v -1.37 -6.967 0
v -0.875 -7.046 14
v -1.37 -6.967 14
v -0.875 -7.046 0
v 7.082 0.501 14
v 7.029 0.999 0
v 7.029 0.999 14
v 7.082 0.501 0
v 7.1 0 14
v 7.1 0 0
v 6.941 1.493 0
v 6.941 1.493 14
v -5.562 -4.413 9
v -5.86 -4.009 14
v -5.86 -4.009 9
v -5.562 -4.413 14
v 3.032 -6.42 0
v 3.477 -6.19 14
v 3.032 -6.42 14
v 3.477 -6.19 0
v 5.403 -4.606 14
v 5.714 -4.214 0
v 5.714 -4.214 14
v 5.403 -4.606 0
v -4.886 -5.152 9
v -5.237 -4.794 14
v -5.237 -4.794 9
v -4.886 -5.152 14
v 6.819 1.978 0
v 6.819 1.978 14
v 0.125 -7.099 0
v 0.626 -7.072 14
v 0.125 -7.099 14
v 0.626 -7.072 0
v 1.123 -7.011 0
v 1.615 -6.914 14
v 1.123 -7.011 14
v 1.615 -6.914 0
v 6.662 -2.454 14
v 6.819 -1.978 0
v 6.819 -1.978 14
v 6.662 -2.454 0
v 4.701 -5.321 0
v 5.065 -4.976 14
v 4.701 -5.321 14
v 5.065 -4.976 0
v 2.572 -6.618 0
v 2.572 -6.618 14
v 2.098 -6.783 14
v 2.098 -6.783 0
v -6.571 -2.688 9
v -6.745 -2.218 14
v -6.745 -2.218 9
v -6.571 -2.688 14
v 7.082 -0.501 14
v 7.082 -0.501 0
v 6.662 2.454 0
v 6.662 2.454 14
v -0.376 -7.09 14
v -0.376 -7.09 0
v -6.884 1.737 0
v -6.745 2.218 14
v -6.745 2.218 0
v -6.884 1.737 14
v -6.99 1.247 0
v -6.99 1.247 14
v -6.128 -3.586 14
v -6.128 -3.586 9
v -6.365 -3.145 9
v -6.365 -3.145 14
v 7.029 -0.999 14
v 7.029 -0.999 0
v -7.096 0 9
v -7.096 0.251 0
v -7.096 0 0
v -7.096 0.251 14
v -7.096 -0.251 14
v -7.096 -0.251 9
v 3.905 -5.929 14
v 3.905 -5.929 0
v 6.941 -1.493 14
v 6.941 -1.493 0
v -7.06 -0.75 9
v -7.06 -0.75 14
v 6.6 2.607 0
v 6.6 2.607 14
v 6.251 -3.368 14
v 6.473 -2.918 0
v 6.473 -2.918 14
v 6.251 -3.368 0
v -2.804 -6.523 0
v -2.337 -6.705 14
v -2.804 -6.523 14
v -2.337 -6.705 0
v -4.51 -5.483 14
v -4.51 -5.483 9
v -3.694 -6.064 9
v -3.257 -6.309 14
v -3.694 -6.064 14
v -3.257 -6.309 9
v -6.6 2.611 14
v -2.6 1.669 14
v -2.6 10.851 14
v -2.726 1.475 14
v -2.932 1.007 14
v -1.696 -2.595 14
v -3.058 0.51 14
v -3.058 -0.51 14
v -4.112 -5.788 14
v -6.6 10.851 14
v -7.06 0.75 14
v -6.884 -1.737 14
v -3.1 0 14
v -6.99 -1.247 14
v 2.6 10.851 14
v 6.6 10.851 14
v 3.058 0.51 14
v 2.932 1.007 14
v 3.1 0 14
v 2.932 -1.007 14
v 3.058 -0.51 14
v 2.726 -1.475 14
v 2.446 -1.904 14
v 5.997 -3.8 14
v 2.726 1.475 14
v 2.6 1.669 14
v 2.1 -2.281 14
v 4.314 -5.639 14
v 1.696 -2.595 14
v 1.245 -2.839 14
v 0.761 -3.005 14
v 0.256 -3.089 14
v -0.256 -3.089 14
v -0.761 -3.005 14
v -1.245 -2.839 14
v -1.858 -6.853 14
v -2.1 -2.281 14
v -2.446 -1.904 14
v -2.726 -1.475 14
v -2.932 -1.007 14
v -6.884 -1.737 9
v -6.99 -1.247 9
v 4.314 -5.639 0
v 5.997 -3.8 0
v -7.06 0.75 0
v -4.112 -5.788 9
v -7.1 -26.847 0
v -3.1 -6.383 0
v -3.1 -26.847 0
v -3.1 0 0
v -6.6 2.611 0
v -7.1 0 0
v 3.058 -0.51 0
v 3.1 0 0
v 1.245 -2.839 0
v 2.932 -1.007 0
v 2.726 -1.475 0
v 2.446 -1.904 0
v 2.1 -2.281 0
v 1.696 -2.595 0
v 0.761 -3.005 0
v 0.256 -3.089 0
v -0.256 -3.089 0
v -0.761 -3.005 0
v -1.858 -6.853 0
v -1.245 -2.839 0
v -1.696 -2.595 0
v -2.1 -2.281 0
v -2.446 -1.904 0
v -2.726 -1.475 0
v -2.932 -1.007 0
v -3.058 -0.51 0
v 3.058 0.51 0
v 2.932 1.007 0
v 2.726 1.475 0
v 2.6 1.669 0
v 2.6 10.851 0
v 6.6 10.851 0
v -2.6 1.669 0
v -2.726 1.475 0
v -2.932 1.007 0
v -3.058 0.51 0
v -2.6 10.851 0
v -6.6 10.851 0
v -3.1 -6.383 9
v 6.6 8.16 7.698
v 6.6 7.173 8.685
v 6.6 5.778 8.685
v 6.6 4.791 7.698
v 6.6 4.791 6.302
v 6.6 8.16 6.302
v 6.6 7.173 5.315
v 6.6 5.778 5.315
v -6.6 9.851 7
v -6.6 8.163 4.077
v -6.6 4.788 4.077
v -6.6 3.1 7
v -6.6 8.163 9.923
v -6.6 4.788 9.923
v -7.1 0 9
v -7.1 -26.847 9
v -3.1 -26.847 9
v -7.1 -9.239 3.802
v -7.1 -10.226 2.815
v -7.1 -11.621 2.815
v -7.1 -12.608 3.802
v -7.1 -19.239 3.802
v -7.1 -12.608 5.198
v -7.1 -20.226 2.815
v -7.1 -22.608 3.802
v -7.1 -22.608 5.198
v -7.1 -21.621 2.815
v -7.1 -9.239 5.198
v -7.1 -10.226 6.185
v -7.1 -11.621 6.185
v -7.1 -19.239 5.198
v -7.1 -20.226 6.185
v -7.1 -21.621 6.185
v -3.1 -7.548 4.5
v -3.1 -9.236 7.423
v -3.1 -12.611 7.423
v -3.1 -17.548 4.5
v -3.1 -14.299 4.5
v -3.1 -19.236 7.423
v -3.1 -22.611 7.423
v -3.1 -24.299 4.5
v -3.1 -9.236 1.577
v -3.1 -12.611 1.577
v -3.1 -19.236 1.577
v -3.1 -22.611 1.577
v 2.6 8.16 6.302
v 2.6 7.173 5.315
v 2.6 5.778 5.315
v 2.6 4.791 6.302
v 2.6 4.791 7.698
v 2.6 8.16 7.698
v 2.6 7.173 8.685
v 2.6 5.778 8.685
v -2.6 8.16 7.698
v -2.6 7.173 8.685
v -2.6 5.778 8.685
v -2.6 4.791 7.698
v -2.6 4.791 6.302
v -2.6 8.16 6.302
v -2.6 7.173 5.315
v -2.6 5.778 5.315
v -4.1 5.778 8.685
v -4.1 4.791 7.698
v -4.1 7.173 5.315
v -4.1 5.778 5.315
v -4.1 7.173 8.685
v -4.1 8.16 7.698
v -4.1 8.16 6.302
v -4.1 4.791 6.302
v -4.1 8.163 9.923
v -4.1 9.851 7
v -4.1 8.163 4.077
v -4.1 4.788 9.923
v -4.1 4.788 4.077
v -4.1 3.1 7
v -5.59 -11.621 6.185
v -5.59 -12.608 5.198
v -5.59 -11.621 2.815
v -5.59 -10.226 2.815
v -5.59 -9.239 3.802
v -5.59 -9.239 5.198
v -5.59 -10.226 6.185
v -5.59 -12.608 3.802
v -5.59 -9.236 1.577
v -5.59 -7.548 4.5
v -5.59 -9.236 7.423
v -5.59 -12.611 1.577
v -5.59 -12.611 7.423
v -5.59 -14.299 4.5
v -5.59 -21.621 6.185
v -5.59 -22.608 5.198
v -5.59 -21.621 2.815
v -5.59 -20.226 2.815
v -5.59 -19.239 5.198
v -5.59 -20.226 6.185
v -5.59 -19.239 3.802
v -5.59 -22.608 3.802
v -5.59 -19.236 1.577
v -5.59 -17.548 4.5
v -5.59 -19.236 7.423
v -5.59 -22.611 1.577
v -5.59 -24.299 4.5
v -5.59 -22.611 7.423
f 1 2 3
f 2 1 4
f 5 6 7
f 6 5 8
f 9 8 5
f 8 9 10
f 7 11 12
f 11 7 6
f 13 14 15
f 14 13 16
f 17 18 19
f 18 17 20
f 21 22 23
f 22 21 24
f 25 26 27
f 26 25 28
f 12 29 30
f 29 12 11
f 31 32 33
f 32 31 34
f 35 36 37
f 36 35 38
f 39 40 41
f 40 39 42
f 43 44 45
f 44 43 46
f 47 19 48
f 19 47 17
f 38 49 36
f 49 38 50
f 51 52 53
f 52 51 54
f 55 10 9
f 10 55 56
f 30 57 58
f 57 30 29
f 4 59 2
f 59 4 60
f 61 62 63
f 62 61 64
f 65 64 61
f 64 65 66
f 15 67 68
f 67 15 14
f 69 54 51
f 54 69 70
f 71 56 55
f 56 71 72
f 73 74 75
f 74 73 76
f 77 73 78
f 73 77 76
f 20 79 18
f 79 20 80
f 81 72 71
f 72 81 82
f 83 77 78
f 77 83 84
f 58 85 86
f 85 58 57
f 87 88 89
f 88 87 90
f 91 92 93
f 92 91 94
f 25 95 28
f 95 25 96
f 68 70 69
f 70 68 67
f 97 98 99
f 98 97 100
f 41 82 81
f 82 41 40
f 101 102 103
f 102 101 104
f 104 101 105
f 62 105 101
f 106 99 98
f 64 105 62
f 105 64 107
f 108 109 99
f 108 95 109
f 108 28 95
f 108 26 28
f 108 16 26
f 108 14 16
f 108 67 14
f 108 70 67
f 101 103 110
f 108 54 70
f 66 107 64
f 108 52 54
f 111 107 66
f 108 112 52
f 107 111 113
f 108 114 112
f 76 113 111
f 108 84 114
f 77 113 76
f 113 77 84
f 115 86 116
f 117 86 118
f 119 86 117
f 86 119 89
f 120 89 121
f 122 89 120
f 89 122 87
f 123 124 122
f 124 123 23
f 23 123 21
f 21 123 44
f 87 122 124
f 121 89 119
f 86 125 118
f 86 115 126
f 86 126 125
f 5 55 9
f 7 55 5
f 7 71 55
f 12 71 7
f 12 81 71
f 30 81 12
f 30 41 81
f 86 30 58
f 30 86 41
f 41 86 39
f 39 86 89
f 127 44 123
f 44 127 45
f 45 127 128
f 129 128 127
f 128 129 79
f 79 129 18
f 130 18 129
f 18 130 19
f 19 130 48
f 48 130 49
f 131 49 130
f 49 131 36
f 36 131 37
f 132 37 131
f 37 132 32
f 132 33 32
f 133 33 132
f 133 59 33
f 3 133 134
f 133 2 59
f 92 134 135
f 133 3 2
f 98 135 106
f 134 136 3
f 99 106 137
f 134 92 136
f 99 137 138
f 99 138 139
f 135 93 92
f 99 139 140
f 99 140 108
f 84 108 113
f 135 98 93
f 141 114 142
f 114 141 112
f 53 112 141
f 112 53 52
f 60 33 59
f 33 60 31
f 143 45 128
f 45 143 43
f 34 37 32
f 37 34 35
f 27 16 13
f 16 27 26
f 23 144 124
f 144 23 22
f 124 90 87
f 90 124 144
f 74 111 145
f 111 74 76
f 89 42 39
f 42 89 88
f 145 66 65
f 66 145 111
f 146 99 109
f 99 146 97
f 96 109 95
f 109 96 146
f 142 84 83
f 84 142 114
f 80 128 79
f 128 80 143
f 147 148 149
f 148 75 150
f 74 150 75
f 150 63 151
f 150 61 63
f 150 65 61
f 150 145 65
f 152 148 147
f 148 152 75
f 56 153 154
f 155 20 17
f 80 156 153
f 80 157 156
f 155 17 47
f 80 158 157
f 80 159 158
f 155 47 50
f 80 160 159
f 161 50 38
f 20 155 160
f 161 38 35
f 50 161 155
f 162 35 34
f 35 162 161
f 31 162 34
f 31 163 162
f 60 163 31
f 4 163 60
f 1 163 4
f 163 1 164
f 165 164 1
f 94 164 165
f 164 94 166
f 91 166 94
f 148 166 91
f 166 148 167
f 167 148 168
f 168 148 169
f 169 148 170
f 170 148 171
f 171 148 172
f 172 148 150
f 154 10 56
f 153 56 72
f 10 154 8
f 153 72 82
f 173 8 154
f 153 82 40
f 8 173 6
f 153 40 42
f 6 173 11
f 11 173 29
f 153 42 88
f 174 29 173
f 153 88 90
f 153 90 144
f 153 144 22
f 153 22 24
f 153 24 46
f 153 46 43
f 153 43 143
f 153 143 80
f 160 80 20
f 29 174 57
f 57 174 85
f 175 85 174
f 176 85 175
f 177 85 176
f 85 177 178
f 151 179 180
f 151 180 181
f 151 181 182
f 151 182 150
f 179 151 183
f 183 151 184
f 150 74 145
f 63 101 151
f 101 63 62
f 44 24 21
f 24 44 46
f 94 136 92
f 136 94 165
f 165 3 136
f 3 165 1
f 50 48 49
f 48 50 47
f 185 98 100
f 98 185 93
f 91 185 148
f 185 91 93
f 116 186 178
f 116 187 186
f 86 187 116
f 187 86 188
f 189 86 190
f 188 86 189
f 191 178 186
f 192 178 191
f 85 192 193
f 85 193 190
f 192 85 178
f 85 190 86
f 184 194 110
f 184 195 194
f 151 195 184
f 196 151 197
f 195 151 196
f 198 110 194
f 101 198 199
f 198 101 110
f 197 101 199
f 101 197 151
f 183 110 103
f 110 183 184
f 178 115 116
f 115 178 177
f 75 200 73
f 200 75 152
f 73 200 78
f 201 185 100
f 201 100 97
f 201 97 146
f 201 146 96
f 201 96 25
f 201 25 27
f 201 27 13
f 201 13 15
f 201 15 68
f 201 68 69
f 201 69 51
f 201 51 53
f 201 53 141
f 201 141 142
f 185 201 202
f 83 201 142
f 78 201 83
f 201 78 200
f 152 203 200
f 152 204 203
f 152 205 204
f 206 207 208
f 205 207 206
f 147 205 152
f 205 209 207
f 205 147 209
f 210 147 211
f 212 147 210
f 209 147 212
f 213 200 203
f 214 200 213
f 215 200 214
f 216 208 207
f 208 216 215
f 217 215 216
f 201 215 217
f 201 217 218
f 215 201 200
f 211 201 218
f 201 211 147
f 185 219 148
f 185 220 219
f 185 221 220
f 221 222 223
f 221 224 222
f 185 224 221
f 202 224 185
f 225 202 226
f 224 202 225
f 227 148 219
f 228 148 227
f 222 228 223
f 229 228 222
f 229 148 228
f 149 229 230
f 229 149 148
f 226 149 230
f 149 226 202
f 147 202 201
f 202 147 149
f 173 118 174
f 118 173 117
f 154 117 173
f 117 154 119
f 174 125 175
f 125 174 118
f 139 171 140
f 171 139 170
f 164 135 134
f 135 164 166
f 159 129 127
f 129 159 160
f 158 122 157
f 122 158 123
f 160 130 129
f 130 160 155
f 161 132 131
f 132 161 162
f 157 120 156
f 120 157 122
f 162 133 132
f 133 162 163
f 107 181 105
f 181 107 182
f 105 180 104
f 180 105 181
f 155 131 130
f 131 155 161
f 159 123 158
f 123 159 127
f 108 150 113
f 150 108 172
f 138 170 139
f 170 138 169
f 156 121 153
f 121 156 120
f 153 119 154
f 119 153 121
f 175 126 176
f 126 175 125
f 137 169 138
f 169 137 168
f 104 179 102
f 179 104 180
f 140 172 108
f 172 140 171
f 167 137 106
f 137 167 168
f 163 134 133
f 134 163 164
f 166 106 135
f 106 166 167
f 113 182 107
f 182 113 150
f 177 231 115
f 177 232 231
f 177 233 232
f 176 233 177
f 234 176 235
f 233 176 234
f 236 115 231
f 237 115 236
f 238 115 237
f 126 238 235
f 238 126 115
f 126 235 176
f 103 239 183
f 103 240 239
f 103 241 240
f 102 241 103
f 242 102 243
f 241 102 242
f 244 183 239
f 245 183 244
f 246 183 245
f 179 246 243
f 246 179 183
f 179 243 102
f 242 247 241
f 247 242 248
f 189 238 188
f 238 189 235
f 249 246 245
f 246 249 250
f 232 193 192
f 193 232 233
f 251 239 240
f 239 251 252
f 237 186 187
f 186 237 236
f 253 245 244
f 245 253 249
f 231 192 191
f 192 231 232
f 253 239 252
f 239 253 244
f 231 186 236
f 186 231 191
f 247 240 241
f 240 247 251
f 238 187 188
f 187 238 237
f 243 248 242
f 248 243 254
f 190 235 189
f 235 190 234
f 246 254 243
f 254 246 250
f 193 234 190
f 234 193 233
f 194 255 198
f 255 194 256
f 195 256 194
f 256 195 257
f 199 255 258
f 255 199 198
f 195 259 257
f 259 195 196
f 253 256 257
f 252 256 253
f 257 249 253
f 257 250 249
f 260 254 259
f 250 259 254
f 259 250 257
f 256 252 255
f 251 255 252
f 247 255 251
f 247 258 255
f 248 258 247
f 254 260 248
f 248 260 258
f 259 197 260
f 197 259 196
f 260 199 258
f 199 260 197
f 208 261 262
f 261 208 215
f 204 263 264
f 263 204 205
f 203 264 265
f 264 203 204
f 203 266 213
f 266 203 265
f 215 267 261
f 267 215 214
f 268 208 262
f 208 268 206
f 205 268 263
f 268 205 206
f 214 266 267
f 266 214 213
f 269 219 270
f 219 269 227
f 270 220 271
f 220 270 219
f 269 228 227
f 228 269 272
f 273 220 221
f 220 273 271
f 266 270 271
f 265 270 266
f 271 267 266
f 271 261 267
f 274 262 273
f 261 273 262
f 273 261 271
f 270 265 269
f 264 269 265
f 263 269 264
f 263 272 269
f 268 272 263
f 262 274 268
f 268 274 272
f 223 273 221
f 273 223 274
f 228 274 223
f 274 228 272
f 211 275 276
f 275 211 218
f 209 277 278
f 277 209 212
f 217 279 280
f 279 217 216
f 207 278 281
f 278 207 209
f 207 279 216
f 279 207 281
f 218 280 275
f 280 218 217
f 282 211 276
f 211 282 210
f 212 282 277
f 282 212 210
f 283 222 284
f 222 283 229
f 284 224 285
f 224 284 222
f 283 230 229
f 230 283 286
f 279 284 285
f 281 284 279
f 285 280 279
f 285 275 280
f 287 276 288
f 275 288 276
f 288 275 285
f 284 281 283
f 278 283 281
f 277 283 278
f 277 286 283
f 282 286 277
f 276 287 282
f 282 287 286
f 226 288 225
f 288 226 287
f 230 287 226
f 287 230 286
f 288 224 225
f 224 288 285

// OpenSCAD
// 6mm endstop for Wallace Reprap by PlanoRepRap 17May2012
// Derrived from y-endstop-holer http://www.thingiverse.com/thing:15683
// Derrived from http://www.thingiverse.com/thing:13482
// Derrived from Prusa Simplifed Mendel by prusajr http://www.thingiverse.com/thing:4148
// Cleanup and additional parameterization by PlanoRepRap for 6mm rods for the Wallace Z axis.

// the rod that this holder will clamp onto
rod_size = 6.2;
// the thickness of the body
clamp_size = 4;
// height of endstop holder
height=9;
// distance between hole centers on your switch
hole_separation = 10; 
//use hole separation of 0 for the under the bed switch to only print one hole -- mount the switch sideways and secure a long bolt through one of the unused bed holes to trip it.

// extra_distance from clamp body to first hole 
hole_extra_distance = 1;



// placement of the switch holes
switch_hole_1 = 1;  // 1 cuts the clamp radius just a bit with the nut hole (adjust using hole_extra_distance of 0  above
switch_hole_2 = switch_hole_1 + hole_separation;

extra_length_switch = hole_separation + switch_hole_1 + 1 ;

// the width of the wedge in the clamp
wedge_size = rod_size -1;

echo("height is", height);
clamp_height = height + 5;

// m3 nut data
m3_size = 3 / cos(180 / 8) + 0.4;
m3_nut_size = 5.5 / cos(180 / 6) + 0.4;
m3_nut_depth = 2.5;

// screws that match your endstop assume m3 - most switches can have their holes drilled out to that size by hand even if they only have 2.5mm holes to start.
// hole_size = 3 / cos(180 / 8) + 0.4;
hole_size = m3_size;
// nut traps for switch assume m3
hole_nut_size = m3_nut_size;
hole_nut_depth = m3_nut_depth;

difference() {
	union() {
		cylinder(r=rod_size / 2 + clamp_size, h=clamp_height, $fn=(rod_size + clamp_size * 2) * 3.14159 * 2);
		translate([wedge_size / -2 - clamp_size, 0, 0]) cube([wedge_size + clamp_size * 2, rod_size / 2 + m3_nut_size + 1, clamp_height]);
//		%translate([-rod_size / 2, 0, 0]) rotate([0, 0, 180]) cube([clamp_size, hole_separation + height / 2 + hole_size / 2 + rod_size / 2 + clamp_size + hole_extra_distance, height]);
	translate([-rod_size / 2, 0, 0]) rotate([0, 0, 180]) cube([clamp_size, extra_length_switch   + hole_size  + rod_size  + clamp_size + hole_extra_distance, height]);
	}

	// rod hole
	translate([0, 0, -2.5]) cylinder(r=rod_size / 2, h=clamp_height + 5, $fn=rod_size * 3.14159 * 2);

	// clamp wedge
	translate([wedge_size / -2, 0, -1]) cube([wedge_size, clamp_size * 3 + 1, clamp_height + 2]);
	
	// clamp screw hole
	translate([0, rod_size / 2 + m3_nut_size / 2, clamp_height / 2]) rotate([0, 90, 0]) rotate([0, 0, 180 / 8]) cylinder(r = m3_size / 2, h = rod_size + clamp_size * 2 + 2, center=true, $fn=8);
	// clamp nut trap
	translate([wedge_size / -2 - clamp_size + m3_nut_depth, rod_size / 2 + m3_nut_size / 2, clamp_height / 2]) rotate([0, -90, 0]) rotate([0, 0, 180 / 6])  cylinder(r = m3_nut_size / 2, h = rod_size / 2 + clamp_size, $fn=6);

	// switch hole 1
	translate([rod_size / -2 - clamp_size - 1, -switch_hole_1 - rod_size / 2 - clamp_size - hole_size / 2 - hole_extra_distance, height / 2]) rotate([0, 90, 0]) rotate([0, 0, 180 / 8]) cylinder(r=hole_size / 2, h=clamp_size + 2, $fn=8);
	// switch hole 1 nut trap
	translate([rod_size / -2 + 0.01 - hole_nut_depth, -switch_hole_1 - rod_size / 2 - clamp_size - hole_size / 2 - hole_extra_distance, height / 2]) rotate([0, 90, 0]) rotate([0, 0, 180 / 6]) cylinder(r=hole_nut_size / 2, h=hole_nut_depth + 10, $fn=6);

	// switch hole 2
	translate([rod_size / -2 - clamp_size - 1, -switch_hole_2 + rod_size / -2 - clamp_size - hole_size / 2 - hole_extra_distance, height / 2]) rotate([0, 90, 0]) rotate([0, 0, 180 / 8]) cylinder(r=hole_size / 2, h=clamp_size + 2, $fn=8);
	// switch hole 2 nut trap
	translate([rod_size / -2 + 0.01 - hole_nut_depth, -switch_hole_2 + rod_size / -2 - clamp_size - hole_size / 2 - hole_extra_distance, height / 2]) rotate([0, 90, 0]) rotate([0, 0, 180 / 6]) cylinder(r=hole_nut_size / 2, h=hole_nut_depth + 10, $fn=6);
   }
